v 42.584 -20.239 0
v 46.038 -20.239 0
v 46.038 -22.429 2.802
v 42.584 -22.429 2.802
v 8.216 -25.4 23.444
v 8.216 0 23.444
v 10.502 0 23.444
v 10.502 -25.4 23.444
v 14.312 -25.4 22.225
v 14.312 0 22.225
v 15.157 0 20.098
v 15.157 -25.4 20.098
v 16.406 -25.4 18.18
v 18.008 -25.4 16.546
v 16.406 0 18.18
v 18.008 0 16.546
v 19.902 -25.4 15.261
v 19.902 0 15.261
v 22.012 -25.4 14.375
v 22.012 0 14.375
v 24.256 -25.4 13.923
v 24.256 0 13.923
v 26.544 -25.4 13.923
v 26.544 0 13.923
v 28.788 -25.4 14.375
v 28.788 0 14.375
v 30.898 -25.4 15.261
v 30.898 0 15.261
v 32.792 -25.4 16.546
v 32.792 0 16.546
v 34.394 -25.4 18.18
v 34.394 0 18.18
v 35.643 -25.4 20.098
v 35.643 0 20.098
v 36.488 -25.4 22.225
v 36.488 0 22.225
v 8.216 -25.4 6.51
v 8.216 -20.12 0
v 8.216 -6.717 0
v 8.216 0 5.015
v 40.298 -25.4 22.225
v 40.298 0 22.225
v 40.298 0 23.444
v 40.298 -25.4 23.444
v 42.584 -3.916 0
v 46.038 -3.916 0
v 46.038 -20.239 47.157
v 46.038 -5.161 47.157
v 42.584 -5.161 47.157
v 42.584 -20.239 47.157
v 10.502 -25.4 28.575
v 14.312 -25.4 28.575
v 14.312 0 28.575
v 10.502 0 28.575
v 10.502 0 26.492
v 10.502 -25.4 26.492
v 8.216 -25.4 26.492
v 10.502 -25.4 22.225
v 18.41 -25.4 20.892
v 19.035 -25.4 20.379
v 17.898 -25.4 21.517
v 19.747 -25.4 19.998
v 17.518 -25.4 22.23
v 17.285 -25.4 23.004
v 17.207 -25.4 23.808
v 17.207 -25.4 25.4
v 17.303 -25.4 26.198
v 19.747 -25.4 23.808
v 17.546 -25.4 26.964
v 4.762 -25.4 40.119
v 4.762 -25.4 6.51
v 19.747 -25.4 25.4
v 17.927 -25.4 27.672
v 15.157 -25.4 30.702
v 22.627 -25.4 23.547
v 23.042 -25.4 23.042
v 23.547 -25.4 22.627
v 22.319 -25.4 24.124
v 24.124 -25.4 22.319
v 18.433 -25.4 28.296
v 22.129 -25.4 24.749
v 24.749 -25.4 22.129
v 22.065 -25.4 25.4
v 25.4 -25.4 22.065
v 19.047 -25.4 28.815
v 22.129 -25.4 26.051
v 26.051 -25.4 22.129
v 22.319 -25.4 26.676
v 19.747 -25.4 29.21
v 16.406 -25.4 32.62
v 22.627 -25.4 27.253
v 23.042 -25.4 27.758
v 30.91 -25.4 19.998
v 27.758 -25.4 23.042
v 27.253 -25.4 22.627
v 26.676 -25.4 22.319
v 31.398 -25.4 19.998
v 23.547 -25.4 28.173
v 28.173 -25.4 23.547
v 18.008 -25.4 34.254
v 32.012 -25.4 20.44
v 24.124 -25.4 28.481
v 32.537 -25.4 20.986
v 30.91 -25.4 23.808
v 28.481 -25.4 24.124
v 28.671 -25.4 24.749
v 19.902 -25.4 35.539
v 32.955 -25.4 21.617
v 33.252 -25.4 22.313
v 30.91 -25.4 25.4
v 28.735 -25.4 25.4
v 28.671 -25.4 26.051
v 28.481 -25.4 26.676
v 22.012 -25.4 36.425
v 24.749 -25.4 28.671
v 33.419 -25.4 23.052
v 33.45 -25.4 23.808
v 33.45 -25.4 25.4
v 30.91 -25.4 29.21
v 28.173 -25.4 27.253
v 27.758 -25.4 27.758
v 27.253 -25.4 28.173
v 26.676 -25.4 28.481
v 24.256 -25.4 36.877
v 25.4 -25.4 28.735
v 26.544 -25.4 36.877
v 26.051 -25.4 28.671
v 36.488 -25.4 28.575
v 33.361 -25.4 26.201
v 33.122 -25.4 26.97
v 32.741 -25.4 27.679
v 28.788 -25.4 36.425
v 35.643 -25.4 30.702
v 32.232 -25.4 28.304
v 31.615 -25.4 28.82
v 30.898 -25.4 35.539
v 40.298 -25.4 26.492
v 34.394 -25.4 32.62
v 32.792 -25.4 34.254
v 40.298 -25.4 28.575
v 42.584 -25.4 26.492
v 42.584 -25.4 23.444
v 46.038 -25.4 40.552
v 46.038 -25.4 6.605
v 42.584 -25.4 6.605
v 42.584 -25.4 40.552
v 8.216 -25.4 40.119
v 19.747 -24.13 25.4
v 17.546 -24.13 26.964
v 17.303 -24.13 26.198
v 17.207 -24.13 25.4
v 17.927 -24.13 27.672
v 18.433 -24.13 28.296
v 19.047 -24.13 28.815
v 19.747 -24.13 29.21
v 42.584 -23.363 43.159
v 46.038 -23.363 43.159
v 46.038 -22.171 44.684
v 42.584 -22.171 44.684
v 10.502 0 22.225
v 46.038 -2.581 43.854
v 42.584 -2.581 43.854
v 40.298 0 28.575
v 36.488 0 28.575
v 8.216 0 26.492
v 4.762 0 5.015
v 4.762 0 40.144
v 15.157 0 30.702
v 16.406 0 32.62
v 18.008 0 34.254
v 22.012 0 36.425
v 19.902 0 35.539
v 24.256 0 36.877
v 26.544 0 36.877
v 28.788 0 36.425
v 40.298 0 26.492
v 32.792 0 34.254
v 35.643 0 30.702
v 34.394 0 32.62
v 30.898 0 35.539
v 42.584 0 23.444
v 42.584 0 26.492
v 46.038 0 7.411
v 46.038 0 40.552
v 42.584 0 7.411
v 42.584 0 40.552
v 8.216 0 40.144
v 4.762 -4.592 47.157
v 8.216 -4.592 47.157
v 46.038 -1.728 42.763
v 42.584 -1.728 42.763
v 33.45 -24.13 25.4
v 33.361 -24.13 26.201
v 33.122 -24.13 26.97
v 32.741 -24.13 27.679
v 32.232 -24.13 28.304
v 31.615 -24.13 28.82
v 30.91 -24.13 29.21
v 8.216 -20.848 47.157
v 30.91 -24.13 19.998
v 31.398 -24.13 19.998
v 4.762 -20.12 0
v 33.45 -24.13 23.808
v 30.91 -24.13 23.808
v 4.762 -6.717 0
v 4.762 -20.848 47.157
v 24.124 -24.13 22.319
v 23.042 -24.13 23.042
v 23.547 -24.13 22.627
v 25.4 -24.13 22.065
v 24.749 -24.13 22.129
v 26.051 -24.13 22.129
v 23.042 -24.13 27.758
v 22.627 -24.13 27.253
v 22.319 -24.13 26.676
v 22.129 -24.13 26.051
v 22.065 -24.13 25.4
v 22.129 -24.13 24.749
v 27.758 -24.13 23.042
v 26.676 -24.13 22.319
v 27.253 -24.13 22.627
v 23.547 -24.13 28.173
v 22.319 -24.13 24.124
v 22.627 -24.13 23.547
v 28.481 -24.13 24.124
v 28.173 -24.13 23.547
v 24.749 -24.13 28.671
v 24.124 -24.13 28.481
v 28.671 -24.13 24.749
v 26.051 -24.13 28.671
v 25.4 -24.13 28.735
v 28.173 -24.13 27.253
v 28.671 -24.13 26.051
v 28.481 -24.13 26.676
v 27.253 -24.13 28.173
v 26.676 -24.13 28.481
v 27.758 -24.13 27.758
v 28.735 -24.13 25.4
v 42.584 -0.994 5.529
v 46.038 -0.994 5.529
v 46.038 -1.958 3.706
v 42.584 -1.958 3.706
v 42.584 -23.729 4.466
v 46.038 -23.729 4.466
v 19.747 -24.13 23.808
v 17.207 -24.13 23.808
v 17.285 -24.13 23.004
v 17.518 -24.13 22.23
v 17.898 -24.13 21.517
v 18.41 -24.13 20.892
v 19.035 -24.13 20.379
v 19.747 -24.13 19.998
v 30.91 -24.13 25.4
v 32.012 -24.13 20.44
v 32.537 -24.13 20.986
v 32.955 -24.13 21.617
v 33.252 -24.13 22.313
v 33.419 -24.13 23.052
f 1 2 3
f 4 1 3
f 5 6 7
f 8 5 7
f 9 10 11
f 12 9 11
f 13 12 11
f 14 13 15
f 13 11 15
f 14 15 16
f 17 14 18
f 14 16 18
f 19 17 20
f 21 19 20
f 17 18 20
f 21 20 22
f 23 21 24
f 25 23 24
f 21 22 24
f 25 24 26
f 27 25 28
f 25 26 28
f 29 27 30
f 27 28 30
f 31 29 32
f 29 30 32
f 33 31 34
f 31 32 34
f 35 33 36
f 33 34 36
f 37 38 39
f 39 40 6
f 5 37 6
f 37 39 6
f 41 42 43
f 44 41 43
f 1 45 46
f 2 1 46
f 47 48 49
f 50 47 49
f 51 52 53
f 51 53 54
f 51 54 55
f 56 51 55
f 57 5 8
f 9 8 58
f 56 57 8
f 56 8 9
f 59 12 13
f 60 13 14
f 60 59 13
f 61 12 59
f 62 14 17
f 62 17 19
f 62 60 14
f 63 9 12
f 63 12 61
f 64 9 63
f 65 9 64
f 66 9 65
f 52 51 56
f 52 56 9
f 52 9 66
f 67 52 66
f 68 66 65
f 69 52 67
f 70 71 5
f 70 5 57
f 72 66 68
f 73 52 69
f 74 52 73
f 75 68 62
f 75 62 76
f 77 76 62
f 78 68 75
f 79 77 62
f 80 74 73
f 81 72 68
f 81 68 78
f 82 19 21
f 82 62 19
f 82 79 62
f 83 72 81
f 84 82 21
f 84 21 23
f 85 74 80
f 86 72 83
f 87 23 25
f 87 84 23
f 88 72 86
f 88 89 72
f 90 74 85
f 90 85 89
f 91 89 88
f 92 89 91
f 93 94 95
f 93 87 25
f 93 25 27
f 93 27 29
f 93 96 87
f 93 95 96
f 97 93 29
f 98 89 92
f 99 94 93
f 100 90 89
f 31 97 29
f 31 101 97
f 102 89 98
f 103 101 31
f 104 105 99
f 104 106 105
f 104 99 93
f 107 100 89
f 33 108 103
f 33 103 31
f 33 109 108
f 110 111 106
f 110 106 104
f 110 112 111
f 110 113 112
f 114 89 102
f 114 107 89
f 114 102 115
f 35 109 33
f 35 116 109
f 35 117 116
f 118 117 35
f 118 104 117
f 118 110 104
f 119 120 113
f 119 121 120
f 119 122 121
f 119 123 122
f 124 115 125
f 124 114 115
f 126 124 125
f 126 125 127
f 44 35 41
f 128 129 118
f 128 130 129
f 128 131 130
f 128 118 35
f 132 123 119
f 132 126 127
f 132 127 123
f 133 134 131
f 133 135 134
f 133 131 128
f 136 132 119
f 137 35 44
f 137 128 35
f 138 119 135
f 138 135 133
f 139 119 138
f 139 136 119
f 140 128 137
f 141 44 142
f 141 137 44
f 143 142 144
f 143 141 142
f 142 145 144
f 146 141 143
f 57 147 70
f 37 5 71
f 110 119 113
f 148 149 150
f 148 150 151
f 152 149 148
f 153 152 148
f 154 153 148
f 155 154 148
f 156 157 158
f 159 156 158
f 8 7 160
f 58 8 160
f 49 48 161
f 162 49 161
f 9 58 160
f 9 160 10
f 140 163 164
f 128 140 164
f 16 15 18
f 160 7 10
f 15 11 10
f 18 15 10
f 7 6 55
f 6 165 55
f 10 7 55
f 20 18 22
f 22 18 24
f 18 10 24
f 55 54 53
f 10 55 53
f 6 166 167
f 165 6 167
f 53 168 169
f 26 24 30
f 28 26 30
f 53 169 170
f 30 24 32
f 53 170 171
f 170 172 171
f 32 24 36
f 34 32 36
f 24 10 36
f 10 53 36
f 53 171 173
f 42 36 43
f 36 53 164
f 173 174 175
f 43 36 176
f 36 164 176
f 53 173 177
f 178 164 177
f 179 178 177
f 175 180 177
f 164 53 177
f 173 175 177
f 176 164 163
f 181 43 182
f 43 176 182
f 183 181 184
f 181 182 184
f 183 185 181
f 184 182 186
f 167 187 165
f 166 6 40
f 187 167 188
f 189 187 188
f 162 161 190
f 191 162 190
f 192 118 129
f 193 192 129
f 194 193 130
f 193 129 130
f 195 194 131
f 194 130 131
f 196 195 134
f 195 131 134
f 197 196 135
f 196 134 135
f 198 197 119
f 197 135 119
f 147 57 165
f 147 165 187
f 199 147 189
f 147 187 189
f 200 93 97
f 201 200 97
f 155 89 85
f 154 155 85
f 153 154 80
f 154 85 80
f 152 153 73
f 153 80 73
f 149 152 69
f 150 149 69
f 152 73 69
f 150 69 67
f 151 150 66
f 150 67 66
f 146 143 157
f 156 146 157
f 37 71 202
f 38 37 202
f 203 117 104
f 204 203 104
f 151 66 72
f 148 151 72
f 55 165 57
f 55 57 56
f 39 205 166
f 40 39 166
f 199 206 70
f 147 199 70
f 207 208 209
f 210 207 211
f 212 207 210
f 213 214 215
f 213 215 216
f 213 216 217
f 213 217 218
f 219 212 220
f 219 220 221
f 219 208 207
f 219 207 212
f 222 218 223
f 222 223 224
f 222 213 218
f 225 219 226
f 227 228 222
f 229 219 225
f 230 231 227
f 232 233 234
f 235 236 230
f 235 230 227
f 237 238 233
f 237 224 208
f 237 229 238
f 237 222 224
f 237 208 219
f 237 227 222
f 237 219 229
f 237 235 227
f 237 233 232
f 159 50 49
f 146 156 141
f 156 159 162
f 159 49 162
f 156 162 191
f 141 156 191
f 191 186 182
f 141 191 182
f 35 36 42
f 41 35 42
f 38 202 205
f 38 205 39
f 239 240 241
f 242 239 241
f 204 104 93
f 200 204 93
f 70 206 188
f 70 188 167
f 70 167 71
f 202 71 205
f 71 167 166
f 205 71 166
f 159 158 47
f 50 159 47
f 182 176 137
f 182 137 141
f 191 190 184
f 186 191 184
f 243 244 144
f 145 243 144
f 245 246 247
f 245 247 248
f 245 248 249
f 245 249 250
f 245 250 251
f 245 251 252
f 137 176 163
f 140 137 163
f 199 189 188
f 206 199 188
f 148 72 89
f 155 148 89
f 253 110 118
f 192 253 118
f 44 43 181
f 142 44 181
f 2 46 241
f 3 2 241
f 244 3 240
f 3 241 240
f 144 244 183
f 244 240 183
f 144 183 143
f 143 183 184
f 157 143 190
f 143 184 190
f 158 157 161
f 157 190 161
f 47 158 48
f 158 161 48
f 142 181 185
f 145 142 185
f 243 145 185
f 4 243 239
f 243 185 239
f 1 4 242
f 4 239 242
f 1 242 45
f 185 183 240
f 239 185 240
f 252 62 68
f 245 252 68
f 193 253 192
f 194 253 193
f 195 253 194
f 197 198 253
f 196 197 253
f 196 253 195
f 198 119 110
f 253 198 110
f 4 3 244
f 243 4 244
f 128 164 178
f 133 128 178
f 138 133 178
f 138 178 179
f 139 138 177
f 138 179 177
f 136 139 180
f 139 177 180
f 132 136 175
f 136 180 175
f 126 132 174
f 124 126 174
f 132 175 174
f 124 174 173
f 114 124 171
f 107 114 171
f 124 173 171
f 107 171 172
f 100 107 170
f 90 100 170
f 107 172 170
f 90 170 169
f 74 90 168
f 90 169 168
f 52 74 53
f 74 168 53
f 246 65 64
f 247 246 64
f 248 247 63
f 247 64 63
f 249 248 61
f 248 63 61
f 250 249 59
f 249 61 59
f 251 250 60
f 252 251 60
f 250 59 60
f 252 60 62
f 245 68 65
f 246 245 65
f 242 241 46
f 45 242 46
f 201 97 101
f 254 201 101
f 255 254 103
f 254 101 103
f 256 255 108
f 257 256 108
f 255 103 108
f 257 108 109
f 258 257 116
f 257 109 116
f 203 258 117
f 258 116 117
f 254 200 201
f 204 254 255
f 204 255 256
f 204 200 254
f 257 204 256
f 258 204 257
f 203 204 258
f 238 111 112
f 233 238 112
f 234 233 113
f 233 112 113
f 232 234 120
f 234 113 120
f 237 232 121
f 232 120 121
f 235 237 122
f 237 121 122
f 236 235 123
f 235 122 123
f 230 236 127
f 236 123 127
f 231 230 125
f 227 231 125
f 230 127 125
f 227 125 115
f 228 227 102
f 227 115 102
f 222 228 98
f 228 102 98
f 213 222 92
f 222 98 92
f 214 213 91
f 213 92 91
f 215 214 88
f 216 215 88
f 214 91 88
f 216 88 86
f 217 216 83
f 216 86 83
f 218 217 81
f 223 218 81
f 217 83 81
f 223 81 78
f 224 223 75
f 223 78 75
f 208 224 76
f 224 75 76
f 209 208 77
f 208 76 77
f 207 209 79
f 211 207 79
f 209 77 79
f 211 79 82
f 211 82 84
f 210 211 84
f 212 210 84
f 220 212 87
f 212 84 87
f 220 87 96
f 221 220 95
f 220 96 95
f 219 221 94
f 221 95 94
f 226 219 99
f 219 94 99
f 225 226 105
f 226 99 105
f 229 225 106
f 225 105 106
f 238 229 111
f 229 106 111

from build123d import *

# Parameters (mm, degrees)
F0_W     = 2.286
F0_H     = 3.048
F1_DEPTH = 25.4
F3_DEPTH = 12.7
F5_DEPTH = 12.7
F6_R     = 3.335139
F7_DEPTH = 1.27


with BuildPart() as f1:
    # F0 (on Front) → F1 (new body)
    with BuildSketch(Plane.XZ):
        Polygon((42.583782, 23.443561), (42.583782, 0), (46.038182, 0), (46.038182, 47.156759), (42.583782, 47.156759), (42.583782, 26.491561), align=None)
        Polygon((4.761818, 47.156759), (4.761818, 0), (8.216218, 0), (8.216218, 23.443561), (8.216218, 26.491561), (8.216218, 47.156759), align=None)
        with BuildLine():
            ThreePointArc((14.312218, 28.575), (13.86659, 25.4), (14.312218, 22.225))
            ThreePointArc((14.312218, 22.225), (25.4, 13.86659), (36.487782, 22.225))
            ThreePointArc((36.487782, 22.225), (36.82146, 23.79694), (36.93341, 25.4))
            ThreePointArc((36.93341, 25.4), (36.82146, 27.00306), (36.487782, 28.575))
            ThreePointArc((36.487782, 28.575), (25.4, 36.93341), (14.312218, 28.575))
        make_face()
        with Locations((9.359218, 24.967561)):
            Rectangle(F0_W, F0_H)
        with BuildLine():
            Line((10.502218, 26.491561), (10.502218, 23.443561))
            Line((10.502218, 23.443561), (10.502218, 22.225))
            Line((10.502218, 22.225), (14.312218, 22.225))
            ThreePointArc((14.312218, 22.225), (13.86659, 25.4), (14.312218, 28.575))
            Line((14.312218, 28.575), (10.502218, 28.575))
            Line((10.502218, 28.575), (10.502218, 26.491561))
        make_face()
        with BuildLine():
            Line((40.297782, 22.225), (40.297782, 23.443561))
            Line((40.297782, 23.443561), (40.297782, 26.491561))
            Line((40.297782, 26.491561), (40.297782, 28.575))
            Line((40.297782, 28.575), (36.487782, 28.575))
            ThreePointArc((36.487782, 28.575), (36.82146, 27.00306), (36.93341, 25.4))
            ThreePointArc((36.93341, 25.4), (36.82146, 23.79694), (36.487782, 22.225))
            Line((36.487782, 22.225), (40.297782, 22.225))
        make_face()
        with Locations((41.440782, 24.967561)):
            Rectangle(F0_W, F0_H)
    extrude(amount=F1_DEPTH)

    # F2 (on face) → F3 (cut)
    with BuildSketch(Plane.YZ.offset(46.038182)):
        Polygon((-25.4, 47.156759), (-25.4, 40.552066), (-23.363257, 43.158547), (-22.17105, 44.684251), (-20.238997, 47.156759), align=None)
        Polygon((0, 47.156759), (-5.161003, 47.156759), (-2.580502, 43.854412), (-1.72774, 42.763107), (0, 40.552066), align=None)
        Polygon((-1.957984, 3.705507), (-3.915968, 0), (0, 0), (0, 7.411013), (-0.994495, 5.528921), align=None)
        Polygon((-23.728574, 4.465718), (-25.4, 6.604693), (-25.4, 0), (-20.238997, 0), (-22.428798, 2.802356), align=None)
    extrude(amount=-F3_DEPTH, mode=Mode.SUBTRACT)

    # F4 (on face) → F5 (cut)
    with BuildSketch(Plane(origin=(4.761818, 0, 0), x_dir=(0, -1, 0), z_dir=(-1, 0, 0))):
        Polygon((0, 47.156759), (0, 40.144437), (4.59187, 47.156759), align=None)
        Polygon((25.4, 47.156759), (20.84787, 47.156759), (25.4, 40.118574), align=None)
        Polygon((25.4, 6.510113), (20.120194, 0), (25.4, 0), align=None)
        Polygon((6.716533, 0), (0, 5.01459), (0, 0), align=None)
    extrude(amount=-F5_DEPTH, mode=Mode.SUBTRACT)

    # F6 (on face) → F7 (cut)
    with BuildSketch(Plane.XZ.offset(25.4)):
        with Locations((25.4, 25.4)):
            Circle(F6_R)
        with BuildLine():
            ThreePointArc((19.747045, 29.21), (17.926817, 27.671819), (17.207045, 25.4))
            Line((17.207045, 25.4), (19.747045, 25.4))
            Line((19.747045, 25.4), (19.747045, 29.21))
        make_face()
        with BuildLine():
            Line((30.909679, 29.21), (30.909679, 25.4))
            Line((30.909679, 25.4), (33.449679, 25.4))
            ThreePointArc((33.449679, 25.4), (32.741123, 27.679296), (30.909679, 29.21))
        make_face()
        with BuildLine():
            Line((19.747045, 19.998197), (19.747045, 23.808197))
            Line((19.747045, 23.808197), (17.207045, 23.808197))
            ThreePointArc((17.207045, 23.808197), (17.898284, 21.517356), (19.747045, 19.998197))
        make_face()
        with BuildLine():
            Line((33.449679, 23.808197), (30.909679, 23.808197))
            Line((30.909679, 23.808197), (30.909679, 19.998197))
            Line((30.909679, 19.998197), (31.397671, 19.998197))
            ThreePointArc((31.397671, 19.998197), (32.955333, 21.616853), (33.449679, 23.808197))
        make_face()
    extrude(amount=-F7_DEPTH, mode=Mode.SUBTRACT)


solid = f1.part
